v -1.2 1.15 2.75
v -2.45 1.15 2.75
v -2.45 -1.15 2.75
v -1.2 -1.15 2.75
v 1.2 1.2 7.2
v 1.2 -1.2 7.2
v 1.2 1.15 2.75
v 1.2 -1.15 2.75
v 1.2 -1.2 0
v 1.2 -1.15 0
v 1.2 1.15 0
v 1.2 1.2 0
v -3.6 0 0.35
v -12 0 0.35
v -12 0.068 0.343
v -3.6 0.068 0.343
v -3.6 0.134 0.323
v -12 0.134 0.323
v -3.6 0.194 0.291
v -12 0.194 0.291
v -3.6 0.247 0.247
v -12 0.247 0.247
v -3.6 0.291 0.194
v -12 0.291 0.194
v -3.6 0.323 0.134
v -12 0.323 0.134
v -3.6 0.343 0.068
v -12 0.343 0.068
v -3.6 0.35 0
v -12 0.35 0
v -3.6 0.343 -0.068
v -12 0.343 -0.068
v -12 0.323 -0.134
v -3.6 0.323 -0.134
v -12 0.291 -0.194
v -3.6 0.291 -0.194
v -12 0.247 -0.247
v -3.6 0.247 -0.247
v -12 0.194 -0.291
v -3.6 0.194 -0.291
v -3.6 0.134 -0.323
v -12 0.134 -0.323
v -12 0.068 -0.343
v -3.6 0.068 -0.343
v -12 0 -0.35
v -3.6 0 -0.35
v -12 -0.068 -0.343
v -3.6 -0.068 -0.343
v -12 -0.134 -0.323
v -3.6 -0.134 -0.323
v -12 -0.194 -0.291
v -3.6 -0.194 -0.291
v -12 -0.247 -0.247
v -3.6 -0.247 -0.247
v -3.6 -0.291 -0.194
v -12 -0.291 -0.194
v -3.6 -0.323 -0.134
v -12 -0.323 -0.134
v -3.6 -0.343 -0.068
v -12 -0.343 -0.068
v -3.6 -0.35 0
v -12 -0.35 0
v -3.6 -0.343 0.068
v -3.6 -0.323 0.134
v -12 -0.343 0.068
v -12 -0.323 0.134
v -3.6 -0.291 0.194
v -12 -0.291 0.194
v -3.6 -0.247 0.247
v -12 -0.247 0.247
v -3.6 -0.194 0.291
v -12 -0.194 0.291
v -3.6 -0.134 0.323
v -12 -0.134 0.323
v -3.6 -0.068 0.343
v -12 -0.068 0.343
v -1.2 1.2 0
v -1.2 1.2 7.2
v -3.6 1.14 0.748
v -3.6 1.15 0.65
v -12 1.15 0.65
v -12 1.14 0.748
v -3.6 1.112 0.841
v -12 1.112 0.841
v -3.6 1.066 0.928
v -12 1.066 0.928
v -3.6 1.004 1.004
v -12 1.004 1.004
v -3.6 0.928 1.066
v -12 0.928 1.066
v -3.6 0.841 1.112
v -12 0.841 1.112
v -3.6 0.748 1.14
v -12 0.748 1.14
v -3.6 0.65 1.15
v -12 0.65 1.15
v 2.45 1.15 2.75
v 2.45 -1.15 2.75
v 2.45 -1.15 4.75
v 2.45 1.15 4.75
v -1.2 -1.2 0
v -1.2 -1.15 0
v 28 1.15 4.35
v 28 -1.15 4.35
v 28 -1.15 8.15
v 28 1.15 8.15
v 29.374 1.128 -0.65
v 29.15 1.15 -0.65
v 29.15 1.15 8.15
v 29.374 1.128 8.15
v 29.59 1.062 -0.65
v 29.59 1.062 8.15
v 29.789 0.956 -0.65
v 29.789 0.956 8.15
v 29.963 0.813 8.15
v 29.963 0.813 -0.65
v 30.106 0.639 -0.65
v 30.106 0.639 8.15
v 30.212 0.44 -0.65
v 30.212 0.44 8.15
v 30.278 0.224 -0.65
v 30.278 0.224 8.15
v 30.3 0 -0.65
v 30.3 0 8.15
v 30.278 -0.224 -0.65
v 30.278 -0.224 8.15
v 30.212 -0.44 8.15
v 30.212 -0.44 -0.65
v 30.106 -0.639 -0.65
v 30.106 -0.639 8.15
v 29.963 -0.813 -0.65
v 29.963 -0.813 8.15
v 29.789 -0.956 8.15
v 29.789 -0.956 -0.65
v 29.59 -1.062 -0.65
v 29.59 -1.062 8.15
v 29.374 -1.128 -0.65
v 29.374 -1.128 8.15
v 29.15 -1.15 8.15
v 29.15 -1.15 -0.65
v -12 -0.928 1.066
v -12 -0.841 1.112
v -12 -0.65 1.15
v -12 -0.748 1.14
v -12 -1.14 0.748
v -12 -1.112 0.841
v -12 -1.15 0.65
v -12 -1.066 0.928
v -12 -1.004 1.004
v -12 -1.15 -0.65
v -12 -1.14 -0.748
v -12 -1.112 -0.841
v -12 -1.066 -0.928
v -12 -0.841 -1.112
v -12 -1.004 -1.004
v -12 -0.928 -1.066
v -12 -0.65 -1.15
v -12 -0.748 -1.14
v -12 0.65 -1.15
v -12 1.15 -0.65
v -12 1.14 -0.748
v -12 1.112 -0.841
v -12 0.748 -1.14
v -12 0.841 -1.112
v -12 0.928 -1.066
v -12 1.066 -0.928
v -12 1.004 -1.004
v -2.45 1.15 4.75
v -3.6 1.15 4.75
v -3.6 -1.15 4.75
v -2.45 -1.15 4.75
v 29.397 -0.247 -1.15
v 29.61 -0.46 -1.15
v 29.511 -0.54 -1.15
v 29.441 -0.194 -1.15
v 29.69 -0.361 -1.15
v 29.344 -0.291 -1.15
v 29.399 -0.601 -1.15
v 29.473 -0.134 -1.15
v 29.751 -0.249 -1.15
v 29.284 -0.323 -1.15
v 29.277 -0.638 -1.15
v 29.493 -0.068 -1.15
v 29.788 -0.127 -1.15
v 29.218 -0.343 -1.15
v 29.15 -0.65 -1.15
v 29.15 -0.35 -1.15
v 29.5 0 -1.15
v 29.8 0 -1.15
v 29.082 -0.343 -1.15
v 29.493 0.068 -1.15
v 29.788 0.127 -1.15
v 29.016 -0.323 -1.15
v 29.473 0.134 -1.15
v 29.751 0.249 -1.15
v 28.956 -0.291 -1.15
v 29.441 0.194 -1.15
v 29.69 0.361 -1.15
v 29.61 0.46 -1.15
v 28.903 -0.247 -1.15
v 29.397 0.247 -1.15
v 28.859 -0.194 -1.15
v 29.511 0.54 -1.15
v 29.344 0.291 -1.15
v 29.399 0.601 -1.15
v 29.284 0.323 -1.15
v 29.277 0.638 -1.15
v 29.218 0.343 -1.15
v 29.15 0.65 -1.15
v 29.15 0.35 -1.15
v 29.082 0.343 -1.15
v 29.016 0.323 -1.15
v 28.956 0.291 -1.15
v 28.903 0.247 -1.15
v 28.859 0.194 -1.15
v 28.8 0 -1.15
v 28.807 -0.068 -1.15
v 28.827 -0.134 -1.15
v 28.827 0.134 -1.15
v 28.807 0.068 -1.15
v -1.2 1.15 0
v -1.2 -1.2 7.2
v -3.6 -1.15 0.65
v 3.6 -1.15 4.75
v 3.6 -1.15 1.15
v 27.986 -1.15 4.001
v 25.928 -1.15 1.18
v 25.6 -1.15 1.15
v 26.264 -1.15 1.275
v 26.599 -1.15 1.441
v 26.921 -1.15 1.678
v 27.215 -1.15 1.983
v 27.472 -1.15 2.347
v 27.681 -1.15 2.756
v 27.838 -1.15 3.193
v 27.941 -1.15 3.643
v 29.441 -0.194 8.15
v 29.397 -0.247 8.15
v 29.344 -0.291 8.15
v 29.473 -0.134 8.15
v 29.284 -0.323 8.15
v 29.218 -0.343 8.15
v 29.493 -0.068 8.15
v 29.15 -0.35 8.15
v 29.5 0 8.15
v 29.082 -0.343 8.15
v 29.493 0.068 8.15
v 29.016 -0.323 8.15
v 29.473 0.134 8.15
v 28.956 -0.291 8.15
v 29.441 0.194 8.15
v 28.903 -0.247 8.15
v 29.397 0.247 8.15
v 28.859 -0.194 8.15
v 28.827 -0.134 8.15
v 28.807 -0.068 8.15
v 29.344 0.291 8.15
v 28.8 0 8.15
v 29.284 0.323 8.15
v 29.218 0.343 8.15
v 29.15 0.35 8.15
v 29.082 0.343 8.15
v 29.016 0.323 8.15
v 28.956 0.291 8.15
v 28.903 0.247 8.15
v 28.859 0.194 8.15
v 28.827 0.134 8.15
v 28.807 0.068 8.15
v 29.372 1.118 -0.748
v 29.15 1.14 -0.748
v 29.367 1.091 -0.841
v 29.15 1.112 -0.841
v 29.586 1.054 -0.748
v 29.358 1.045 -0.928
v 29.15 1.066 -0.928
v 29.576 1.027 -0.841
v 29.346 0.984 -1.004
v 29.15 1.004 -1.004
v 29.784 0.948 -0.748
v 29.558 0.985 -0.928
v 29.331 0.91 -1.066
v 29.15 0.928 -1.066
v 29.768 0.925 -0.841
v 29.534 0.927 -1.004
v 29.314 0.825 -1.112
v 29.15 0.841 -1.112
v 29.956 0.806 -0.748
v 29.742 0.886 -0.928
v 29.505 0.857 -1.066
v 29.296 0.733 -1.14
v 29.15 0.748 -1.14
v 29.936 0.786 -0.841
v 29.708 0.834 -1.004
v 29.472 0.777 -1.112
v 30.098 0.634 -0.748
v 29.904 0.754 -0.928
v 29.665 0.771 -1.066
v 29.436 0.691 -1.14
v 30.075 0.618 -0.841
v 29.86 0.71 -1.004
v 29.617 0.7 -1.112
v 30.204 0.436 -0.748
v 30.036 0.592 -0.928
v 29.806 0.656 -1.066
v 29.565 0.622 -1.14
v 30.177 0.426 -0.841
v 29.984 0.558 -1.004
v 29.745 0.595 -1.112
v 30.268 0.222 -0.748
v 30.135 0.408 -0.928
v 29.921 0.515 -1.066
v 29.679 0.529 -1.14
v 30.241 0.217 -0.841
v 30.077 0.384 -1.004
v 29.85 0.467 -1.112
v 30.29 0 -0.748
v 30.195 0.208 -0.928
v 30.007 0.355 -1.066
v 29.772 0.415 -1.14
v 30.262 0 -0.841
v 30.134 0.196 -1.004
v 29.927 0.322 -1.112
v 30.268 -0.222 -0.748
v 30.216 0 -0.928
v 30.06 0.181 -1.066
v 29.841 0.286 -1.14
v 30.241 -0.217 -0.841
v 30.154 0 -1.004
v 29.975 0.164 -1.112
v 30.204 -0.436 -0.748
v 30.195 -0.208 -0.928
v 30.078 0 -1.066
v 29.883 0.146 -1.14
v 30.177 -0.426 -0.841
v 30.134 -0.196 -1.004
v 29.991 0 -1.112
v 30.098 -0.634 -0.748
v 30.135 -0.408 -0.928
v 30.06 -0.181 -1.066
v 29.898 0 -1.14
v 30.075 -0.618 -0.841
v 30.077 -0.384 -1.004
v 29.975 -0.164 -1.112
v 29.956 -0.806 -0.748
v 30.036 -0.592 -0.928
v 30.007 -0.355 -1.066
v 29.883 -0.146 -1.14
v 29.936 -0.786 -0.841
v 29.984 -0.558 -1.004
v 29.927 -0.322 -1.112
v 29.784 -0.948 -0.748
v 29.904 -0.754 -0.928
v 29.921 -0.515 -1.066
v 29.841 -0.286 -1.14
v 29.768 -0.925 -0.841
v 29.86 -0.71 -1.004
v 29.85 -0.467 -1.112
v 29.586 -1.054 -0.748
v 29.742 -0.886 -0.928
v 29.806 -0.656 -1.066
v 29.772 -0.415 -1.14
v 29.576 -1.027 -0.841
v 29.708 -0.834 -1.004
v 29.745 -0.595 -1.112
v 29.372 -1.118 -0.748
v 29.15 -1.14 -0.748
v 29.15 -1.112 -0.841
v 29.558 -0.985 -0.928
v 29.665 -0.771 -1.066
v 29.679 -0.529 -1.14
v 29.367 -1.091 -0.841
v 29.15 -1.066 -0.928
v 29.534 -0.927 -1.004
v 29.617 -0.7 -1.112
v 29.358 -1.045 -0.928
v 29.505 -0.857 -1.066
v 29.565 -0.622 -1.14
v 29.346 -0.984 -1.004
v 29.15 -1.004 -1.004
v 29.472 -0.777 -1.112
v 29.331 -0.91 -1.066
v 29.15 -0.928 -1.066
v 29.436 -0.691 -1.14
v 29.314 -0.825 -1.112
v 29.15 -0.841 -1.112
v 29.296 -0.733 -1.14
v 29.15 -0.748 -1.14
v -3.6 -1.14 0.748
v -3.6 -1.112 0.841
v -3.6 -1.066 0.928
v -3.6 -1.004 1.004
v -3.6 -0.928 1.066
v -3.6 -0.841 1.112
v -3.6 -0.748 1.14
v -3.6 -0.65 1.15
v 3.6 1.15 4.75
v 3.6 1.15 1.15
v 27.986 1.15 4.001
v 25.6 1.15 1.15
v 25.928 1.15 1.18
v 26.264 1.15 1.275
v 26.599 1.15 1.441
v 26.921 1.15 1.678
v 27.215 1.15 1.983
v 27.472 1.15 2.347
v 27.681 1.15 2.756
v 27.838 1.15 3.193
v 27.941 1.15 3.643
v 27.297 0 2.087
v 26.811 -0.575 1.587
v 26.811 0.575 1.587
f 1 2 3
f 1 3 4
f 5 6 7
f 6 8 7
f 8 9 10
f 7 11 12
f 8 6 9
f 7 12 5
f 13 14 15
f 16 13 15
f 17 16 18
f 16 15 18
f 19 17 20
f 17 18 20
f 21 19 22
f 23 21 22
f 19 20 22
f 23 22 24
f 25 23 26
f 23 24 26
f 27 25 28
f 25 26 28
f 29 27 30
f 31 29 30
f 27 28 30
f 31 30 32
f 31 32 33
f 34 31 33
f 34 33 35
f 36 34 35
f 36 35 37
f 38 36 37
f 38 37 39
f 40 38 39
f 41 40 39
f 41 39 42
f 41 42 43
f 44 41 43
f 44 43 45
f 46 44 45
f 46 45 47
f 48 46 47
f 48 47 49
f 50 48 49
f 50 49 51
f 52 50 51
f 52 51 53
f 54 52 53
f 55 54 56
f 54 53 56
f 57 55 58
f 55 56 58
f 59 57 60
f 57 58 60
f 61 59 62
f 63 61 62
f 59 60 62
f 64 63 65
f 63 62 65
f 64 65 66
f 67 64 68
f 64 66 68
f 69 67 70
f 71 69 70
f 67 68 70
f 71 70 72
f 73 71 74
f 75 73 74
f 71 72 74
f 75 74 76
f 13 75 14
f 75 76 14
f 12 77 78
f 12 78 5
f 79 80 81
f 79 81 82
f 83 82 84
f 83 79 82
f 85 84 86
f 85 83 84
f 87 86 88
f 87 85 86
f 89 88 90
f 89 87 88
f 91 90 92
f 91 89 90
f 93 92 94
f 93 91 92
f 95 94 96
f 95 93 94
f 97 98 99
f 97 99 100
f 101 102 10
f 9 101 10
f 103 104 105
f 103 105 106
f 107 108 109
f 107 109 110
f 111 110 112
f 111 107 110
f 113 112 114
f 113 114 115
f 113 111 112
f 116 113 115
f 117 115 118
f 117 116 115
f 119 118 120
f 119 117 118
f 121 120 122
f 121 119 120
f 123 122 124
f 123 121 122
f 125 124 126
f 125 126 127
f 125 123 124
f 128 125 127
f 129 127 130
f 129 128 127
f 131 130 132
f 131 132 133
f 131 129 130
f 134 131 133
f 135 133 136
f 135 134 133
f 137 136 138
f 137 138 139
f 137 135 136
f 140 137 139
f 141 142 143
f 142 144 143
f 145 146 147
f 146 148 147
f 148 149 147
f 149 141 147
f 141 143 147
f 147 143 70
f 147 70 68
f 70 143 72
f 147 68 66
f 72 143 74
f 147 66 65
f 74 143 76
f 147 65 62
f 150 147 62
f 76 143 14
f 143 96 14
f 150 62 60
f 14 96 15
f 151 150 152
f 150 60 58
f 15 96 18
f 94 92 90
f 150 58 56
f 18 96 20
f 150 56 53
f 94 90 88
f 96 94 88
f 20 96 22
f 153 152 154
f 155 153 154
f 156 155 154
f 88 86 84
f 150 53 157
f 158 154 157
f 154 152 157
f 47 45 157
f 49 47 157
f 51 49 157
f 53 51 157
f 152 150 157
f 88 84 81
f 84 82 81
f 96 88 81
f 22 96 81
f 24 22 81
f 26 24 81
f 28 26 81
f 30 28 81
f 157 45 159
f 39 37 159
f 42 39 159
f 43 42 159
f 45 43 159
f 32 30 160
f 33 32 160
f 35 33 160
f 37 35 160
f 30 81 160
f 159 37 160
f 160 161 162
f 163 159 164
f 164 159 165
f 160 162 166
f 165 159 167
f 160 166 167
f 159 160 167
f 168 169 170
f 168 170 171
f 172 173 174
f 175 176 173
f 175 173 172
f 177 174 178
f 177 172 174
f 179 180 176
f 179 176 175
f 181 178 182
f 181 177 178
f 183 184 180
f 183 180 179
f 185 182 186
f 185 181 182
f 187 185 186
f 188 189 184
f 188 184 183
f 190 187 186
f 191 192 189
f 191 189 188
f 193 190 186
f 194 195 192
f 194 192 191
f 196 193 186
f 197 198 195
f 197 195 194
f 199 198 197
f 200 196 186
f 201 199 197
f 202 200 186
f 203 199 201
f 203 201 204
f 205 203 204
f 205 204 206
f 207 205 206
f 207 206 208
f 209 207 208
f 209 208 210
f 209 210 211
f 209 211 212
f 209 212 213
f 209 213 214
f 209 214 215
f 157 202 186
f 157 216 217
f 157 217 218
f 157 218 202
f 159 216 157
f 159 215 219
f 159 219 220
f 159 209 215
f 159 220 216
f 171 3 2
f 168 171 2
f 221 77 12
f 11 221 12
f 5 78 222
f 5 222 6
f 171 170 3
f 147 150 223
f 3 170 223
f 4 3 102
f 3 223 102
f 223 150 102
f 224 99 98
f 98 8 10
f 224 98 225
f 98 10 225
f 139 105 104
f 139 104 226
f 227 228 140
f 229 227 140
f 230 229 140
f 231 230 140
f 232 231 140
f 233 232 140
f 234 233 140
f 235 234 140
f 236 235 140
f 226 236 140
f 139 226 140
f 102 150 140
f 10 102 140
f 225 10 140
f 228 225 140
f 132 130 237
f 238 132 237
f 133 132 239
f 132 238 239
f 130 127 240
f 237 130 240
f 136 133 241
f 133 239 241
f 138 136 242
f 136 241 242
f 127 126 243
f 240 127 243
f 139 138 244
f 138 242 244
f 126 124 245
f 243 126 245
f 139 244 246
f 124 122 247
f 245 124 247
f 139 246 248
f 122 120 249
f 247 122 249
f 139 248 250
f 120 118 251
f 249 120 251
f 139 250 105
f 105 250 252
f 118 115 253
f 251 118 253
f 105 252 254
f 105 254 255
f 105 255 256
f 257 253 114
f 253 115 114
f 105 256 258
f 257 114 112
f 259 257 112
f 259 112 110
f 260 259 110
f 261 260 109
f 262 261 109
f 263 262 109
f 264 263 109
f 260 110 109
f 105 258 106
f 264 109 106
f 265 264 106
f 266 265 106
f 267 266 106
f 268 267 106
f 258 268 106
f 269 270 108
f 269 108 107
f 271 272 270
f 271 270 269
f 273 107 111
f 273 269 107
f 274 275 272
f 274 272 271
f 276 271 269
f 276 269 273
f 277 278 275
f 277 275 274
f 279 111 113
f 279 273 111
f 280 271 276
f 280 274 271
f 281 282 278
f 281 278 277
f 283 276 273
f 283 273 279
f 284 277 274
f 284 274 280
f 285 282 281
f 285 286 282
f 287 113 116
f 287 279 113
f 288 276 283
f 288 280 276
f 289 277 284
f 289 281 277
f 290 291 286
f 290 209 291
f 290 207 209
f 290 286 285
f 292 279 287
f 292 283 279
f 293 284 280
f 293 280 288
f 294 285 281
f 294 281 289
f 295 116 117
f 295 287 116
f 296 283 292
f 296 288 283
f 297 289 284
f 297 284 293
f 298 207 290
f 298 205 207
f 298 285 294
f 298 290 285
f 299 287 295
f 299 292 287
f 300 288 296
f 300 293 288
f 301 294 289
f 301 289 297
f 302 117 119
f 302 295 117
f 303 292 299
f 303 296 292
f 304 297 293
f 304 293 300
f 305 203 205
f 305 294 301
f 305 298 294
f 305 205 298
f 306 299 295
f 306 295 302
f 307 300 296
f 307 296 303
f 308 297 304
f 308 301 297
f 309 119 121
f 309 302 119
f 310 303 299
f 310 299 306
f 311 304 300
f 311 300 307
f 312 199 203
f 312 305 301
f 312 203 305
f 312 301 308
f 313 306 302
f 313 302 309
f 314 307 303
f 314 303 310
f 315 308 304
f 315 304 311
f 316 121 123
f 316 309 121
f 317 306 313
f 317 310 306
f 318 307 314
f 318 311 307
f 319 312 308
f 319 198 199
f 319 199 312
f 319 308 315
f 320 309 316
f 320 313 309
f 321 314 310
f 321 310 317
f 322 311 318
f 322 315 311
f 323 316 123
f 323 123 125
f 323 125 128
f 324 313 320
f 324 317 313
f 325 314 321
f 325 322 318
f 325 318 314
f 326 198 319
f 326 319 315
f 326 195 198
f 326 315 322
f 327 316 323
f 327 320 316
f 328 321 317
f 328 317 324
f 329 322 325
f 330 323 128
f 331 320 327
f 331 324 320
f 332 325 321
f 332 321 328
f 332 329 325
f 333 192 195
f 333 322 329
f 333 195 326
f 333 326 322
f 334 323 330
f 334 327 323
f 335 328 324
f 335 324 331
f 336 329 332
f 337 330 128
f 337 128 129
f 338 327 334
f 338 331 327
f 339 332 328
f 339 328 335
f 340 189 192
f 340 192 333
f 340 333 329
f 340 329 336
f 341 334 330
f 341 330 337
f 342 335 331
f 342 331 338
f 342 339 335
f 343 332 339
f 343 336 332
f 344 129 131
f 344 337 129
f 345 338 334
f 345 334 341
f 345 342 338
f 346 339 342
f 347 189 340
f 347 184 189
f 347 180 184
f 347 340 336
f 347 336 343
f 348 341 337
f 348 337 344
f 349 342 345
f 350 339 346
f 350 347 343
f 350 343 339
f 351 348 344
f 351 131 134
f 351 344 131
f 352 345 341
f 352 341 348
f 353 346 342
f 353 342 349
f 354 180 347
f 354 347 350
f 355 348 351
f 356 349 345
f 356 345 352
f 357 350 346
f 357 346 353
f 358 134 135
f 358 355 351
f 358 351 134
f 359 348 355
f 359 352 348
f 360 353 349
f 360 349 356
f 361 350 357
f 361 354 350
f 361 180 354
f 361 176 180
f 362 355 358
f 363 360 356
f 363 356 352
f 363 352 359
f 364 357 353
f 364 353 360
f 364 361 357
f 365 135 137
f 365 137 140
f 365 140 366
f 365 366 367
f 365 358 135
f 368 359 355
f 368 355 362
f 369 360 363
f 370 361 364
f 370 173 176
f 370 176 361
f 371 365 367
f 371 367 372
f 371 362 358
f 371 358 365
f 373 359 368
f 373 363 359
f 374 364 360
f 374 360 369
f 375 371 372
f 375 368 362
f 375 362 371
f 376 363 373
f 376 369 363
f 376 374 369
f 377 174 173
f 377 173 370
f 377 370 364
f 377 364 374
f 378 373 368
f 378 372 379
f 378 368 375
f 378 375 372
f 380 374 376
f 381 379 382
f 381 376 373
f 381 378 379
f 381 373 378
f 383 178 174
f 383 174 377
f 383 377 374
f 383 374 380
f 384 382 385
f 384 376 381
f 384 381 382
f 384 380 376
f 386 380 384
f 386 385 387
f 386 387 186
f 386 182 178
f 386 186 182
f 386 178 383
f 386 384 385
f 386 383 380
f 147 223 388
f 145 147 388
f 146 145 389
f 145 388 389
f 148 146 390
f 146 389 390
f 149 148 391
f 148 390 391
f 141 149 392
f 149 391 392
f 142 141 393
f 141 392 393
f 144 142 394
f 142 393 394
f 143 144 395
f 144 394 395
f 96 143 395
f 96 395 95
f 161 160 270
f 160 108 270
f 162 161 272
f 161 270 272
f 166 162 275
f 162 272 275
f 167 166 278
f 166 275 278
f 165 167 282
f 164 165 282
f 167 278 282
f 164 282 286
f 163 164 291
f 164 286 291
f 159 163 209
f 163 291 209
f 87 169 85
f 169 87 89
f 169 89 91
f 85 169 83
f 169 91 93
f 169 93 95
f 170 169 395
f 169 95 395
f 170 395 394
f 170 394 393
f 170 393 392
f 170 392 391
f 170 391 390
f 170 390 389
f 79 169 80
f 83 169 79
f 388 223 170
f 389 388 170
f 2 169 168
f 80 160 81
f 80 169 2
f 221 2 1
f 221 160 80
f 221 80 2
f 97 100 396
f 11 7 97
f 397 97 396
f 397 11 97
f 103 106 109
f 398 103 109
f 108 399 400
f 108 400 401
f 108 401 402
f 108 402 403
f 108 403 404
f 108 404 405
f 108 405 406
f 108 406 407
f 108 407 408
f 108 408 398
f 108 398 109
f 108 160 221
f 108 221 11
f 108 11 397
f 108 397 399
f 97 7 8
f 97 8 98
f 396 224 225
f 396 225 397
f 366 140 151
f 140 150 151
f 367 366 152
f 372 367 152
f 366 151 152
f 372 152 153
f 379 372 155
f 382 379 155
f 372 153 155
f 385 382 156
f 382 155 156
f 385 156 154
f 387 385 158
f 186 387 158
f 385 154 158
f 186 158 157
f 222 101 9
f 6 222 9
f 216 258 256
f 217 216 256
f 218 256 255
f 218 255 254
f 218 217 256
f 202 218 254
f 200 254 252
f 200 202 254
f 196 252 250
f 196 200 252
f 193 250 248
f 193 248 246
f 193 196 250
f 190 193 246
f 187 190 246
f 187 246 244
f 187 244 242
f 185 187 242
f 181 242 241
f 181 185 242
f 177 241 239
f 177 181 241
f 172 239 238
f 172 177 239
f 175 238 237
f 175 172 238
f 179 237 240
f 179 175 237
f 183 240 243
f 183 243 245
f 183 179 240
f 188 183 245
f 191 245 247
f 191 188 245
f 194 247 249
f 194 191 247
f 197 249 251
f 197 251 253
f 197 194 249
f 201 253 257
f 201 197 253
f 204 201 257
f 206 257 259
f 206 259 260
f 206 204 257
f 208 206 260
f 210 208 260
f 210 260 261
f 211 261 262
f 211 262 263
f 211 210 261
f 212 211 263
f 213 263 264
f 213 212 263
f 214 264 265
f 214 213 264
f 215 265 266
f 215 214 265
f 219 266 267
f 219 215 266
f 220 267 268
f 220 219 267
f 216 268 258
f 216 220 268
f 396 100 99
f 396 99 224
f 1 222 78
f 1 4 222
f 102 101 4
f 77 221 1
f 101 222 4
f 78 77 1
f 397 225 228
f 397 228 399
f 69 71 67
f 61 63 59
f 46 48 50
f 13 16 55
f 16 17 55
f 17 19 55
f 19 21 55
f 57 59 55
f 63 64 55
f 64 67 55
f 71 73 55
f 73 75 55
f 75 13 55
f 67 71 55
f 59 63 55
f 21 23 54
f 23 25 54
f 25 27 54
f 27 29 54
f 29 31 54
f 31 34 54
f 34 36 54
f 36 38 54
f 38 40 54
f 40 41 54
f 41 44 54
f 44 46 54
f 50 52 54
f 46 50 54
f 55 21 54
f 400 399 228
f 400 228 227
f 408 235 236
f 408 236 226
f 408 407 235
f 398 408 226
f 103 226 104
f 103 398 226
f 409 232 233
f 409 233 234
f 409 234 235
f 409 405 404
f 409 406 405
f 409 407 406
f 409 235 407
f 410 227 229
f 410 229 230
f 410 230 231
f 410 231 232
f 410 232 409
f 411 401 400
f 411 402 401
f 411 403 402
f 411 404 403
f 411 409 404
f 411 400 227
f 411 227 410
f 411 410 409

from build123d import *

# Parameters (mm, degrees)
SKETCH_1_W           = 2.4
SKETCH_1_H           = 2.4
EXTRUDE_1_DEPTH      = 7.2
EXTRUDE_2_DEPTH      = 28
EXTRUDE_2_DEPTH_BACK = 12
SKETCH_4_W           = 2.3
SKETCH_4_H           = 2.3
EXTRUDE_3_DEPTH      = 7
EXTRUDE_3_DEPTH_BACK = 2.3
SKETCH_5_R           = 0.35
SKETCH_6_R           = 0.35
CUT_EXTRUDE_1_DEPTH  = 10
FILLET_1_SIZE        = 2.4
FILLET_1_SIZE_2      = 3.2
FILLET_2_R           = 0.5
EXTRUDE_START        = -1.5
SKETCH_7_W           = 1.15
SKETCH_7_H           = 0.5
SKETCH_7_H_2         = 1.3
SKETCH_7_H_3         = 2.3
EXTRUDE_4_DEPTH      = 5.1
SKETCH_8_W           = 7.2
SKETCH_8_H           = 2.3
EXTRUDE_5_DEPTH      = 3.1


with BuildPart() as part:
    # 草图1 → 凸台-拉伸1 (new body)
    with BuildSketch(Plane.XY):
        Rectangle(SKETCH_1_W, SKETCH_1_H)
    extrude(amount=EXTRUDE_1_DEPTH)

    # 草图4 → 凸台-拉伸2 (add, two sides: drawn at the far end of the back side and taken through both)
    with BuildSketch(Plane(origin=(0, 0, 0), x_dir=(0, 0, -1), z_dir=(1, 0, 0)).offset(-EXTRUDE_2_DEPTH_BACK)):
        Rectangle(SKETCH_4_W, SKETCH_4_H)
    extrude(amount=EXTRUDE_2_DEPTH + EXTRUDE_2_DEPTH_BACK)

    # 草图5 → 凸台-拉伸3 (add, two sides: drawn at the far end of the back side and taken through both)
    with BuildSketch(Plane.XY.offset(1.15).offset(-EXTRUDE_3_DEPTH_BACK)):
        with BuildLine():
            Line((28, 0), (28, 1.15))
            Line((28, 1.15), (29.15, 1.15))
            ThreePointArc((29.15, 1.15), (30.3, 0), (29.15, -1.15))
            Line((29.15, -1.15), (28, -1.15))
            Line((28, -1.15), (28, 0))
        make_face()
        with Locations(Location((29.15, 0, 0), (0, 0, 180))):
            Circle(SKETCH_5_R, mode=Mode.SUBTRACT)
    extrude(amount=EXTRUDE_3_DEPTH + EXTRUDE_3_DEPTH_BACK)

    # 草图6 → 切除-拉伸1 (cut)
    with BuildSketch(Plane.ZY.offset(12)):
        Circle(SKETCH_6_R)
    extrude(amount=-CUT_EXTRUDE_1_DEPTH, mode=Mode.SUBTRACT)

    # 圆角1
    # an asymmetric fillet: 3.2, 2.4 mm, written as the material it adds along each edge
    with BuildSketch(Plane(origin=(28, 1.15, 1.15), x_dir=(-1, 0, 0), z_dir=(0, -1, 0))) as fillet_1_piece_1:
        with BuildLine():
            Bezier((FILLET_1_SIZE, 0), (0, 0), (0, -FILLET_1_SIZE_2), weights=[1, 0.707106781, 1])
            Line((0, -FILLET_1_SIZE_2), (0, 0))
            Line((0, 0), (FILLET_1_SIZE, 0))
        make_face()
    extrude(amount=2.3)

    # 圆角2
    fillet_2_edges = [part.edges().sort_by_distance(p)[0] for p in [
        (-6.6, -1.15, 1.15),
        (8.575, -1.15, -1.15),
        (-6.6, 1.15, 1.15),
        (8.575, 1.15, -1.15),
        (30.3, 0, -1.15),
    ]]
    fillet(fillet_2_edges, radius=FILLET_2_R)

    # 草图7 → 凸台-拉伸4 (add)
    with BuildSketch(Plane.XY.offset(1.15).offset(EXTRUDE_START)):
        with Locations((-3.025, 0.9)):
            Rectangle(SKETCH_7_W, SKETCH_7_H)
        with Locations((-3.025, 0)):
            Rectangle(SKETCH_7_W, SKETCH_7_H_2)
        with Locations((-3.025, -0.9)):
            Rectangle(SKETCH_7_W, SKETCH_7_H)
        with Locations((3.025, 0)):
            Rectangle(SKETCH_7_W, SKETCH_7_H_3)
    extrude(amount=EXTRUDE_4_DEPTH)

    # 草图8 → 凸台-拉伸5 (add)
    with BuildSketch(Plane.XY.offset(1.15).offset(EXTRUDE_START)):
        Rectangle(SKETCH_8_W, SKETCH_8_H)
    extrude(amount=EXTRUDE_5_DEPTH)


solid = part.part
